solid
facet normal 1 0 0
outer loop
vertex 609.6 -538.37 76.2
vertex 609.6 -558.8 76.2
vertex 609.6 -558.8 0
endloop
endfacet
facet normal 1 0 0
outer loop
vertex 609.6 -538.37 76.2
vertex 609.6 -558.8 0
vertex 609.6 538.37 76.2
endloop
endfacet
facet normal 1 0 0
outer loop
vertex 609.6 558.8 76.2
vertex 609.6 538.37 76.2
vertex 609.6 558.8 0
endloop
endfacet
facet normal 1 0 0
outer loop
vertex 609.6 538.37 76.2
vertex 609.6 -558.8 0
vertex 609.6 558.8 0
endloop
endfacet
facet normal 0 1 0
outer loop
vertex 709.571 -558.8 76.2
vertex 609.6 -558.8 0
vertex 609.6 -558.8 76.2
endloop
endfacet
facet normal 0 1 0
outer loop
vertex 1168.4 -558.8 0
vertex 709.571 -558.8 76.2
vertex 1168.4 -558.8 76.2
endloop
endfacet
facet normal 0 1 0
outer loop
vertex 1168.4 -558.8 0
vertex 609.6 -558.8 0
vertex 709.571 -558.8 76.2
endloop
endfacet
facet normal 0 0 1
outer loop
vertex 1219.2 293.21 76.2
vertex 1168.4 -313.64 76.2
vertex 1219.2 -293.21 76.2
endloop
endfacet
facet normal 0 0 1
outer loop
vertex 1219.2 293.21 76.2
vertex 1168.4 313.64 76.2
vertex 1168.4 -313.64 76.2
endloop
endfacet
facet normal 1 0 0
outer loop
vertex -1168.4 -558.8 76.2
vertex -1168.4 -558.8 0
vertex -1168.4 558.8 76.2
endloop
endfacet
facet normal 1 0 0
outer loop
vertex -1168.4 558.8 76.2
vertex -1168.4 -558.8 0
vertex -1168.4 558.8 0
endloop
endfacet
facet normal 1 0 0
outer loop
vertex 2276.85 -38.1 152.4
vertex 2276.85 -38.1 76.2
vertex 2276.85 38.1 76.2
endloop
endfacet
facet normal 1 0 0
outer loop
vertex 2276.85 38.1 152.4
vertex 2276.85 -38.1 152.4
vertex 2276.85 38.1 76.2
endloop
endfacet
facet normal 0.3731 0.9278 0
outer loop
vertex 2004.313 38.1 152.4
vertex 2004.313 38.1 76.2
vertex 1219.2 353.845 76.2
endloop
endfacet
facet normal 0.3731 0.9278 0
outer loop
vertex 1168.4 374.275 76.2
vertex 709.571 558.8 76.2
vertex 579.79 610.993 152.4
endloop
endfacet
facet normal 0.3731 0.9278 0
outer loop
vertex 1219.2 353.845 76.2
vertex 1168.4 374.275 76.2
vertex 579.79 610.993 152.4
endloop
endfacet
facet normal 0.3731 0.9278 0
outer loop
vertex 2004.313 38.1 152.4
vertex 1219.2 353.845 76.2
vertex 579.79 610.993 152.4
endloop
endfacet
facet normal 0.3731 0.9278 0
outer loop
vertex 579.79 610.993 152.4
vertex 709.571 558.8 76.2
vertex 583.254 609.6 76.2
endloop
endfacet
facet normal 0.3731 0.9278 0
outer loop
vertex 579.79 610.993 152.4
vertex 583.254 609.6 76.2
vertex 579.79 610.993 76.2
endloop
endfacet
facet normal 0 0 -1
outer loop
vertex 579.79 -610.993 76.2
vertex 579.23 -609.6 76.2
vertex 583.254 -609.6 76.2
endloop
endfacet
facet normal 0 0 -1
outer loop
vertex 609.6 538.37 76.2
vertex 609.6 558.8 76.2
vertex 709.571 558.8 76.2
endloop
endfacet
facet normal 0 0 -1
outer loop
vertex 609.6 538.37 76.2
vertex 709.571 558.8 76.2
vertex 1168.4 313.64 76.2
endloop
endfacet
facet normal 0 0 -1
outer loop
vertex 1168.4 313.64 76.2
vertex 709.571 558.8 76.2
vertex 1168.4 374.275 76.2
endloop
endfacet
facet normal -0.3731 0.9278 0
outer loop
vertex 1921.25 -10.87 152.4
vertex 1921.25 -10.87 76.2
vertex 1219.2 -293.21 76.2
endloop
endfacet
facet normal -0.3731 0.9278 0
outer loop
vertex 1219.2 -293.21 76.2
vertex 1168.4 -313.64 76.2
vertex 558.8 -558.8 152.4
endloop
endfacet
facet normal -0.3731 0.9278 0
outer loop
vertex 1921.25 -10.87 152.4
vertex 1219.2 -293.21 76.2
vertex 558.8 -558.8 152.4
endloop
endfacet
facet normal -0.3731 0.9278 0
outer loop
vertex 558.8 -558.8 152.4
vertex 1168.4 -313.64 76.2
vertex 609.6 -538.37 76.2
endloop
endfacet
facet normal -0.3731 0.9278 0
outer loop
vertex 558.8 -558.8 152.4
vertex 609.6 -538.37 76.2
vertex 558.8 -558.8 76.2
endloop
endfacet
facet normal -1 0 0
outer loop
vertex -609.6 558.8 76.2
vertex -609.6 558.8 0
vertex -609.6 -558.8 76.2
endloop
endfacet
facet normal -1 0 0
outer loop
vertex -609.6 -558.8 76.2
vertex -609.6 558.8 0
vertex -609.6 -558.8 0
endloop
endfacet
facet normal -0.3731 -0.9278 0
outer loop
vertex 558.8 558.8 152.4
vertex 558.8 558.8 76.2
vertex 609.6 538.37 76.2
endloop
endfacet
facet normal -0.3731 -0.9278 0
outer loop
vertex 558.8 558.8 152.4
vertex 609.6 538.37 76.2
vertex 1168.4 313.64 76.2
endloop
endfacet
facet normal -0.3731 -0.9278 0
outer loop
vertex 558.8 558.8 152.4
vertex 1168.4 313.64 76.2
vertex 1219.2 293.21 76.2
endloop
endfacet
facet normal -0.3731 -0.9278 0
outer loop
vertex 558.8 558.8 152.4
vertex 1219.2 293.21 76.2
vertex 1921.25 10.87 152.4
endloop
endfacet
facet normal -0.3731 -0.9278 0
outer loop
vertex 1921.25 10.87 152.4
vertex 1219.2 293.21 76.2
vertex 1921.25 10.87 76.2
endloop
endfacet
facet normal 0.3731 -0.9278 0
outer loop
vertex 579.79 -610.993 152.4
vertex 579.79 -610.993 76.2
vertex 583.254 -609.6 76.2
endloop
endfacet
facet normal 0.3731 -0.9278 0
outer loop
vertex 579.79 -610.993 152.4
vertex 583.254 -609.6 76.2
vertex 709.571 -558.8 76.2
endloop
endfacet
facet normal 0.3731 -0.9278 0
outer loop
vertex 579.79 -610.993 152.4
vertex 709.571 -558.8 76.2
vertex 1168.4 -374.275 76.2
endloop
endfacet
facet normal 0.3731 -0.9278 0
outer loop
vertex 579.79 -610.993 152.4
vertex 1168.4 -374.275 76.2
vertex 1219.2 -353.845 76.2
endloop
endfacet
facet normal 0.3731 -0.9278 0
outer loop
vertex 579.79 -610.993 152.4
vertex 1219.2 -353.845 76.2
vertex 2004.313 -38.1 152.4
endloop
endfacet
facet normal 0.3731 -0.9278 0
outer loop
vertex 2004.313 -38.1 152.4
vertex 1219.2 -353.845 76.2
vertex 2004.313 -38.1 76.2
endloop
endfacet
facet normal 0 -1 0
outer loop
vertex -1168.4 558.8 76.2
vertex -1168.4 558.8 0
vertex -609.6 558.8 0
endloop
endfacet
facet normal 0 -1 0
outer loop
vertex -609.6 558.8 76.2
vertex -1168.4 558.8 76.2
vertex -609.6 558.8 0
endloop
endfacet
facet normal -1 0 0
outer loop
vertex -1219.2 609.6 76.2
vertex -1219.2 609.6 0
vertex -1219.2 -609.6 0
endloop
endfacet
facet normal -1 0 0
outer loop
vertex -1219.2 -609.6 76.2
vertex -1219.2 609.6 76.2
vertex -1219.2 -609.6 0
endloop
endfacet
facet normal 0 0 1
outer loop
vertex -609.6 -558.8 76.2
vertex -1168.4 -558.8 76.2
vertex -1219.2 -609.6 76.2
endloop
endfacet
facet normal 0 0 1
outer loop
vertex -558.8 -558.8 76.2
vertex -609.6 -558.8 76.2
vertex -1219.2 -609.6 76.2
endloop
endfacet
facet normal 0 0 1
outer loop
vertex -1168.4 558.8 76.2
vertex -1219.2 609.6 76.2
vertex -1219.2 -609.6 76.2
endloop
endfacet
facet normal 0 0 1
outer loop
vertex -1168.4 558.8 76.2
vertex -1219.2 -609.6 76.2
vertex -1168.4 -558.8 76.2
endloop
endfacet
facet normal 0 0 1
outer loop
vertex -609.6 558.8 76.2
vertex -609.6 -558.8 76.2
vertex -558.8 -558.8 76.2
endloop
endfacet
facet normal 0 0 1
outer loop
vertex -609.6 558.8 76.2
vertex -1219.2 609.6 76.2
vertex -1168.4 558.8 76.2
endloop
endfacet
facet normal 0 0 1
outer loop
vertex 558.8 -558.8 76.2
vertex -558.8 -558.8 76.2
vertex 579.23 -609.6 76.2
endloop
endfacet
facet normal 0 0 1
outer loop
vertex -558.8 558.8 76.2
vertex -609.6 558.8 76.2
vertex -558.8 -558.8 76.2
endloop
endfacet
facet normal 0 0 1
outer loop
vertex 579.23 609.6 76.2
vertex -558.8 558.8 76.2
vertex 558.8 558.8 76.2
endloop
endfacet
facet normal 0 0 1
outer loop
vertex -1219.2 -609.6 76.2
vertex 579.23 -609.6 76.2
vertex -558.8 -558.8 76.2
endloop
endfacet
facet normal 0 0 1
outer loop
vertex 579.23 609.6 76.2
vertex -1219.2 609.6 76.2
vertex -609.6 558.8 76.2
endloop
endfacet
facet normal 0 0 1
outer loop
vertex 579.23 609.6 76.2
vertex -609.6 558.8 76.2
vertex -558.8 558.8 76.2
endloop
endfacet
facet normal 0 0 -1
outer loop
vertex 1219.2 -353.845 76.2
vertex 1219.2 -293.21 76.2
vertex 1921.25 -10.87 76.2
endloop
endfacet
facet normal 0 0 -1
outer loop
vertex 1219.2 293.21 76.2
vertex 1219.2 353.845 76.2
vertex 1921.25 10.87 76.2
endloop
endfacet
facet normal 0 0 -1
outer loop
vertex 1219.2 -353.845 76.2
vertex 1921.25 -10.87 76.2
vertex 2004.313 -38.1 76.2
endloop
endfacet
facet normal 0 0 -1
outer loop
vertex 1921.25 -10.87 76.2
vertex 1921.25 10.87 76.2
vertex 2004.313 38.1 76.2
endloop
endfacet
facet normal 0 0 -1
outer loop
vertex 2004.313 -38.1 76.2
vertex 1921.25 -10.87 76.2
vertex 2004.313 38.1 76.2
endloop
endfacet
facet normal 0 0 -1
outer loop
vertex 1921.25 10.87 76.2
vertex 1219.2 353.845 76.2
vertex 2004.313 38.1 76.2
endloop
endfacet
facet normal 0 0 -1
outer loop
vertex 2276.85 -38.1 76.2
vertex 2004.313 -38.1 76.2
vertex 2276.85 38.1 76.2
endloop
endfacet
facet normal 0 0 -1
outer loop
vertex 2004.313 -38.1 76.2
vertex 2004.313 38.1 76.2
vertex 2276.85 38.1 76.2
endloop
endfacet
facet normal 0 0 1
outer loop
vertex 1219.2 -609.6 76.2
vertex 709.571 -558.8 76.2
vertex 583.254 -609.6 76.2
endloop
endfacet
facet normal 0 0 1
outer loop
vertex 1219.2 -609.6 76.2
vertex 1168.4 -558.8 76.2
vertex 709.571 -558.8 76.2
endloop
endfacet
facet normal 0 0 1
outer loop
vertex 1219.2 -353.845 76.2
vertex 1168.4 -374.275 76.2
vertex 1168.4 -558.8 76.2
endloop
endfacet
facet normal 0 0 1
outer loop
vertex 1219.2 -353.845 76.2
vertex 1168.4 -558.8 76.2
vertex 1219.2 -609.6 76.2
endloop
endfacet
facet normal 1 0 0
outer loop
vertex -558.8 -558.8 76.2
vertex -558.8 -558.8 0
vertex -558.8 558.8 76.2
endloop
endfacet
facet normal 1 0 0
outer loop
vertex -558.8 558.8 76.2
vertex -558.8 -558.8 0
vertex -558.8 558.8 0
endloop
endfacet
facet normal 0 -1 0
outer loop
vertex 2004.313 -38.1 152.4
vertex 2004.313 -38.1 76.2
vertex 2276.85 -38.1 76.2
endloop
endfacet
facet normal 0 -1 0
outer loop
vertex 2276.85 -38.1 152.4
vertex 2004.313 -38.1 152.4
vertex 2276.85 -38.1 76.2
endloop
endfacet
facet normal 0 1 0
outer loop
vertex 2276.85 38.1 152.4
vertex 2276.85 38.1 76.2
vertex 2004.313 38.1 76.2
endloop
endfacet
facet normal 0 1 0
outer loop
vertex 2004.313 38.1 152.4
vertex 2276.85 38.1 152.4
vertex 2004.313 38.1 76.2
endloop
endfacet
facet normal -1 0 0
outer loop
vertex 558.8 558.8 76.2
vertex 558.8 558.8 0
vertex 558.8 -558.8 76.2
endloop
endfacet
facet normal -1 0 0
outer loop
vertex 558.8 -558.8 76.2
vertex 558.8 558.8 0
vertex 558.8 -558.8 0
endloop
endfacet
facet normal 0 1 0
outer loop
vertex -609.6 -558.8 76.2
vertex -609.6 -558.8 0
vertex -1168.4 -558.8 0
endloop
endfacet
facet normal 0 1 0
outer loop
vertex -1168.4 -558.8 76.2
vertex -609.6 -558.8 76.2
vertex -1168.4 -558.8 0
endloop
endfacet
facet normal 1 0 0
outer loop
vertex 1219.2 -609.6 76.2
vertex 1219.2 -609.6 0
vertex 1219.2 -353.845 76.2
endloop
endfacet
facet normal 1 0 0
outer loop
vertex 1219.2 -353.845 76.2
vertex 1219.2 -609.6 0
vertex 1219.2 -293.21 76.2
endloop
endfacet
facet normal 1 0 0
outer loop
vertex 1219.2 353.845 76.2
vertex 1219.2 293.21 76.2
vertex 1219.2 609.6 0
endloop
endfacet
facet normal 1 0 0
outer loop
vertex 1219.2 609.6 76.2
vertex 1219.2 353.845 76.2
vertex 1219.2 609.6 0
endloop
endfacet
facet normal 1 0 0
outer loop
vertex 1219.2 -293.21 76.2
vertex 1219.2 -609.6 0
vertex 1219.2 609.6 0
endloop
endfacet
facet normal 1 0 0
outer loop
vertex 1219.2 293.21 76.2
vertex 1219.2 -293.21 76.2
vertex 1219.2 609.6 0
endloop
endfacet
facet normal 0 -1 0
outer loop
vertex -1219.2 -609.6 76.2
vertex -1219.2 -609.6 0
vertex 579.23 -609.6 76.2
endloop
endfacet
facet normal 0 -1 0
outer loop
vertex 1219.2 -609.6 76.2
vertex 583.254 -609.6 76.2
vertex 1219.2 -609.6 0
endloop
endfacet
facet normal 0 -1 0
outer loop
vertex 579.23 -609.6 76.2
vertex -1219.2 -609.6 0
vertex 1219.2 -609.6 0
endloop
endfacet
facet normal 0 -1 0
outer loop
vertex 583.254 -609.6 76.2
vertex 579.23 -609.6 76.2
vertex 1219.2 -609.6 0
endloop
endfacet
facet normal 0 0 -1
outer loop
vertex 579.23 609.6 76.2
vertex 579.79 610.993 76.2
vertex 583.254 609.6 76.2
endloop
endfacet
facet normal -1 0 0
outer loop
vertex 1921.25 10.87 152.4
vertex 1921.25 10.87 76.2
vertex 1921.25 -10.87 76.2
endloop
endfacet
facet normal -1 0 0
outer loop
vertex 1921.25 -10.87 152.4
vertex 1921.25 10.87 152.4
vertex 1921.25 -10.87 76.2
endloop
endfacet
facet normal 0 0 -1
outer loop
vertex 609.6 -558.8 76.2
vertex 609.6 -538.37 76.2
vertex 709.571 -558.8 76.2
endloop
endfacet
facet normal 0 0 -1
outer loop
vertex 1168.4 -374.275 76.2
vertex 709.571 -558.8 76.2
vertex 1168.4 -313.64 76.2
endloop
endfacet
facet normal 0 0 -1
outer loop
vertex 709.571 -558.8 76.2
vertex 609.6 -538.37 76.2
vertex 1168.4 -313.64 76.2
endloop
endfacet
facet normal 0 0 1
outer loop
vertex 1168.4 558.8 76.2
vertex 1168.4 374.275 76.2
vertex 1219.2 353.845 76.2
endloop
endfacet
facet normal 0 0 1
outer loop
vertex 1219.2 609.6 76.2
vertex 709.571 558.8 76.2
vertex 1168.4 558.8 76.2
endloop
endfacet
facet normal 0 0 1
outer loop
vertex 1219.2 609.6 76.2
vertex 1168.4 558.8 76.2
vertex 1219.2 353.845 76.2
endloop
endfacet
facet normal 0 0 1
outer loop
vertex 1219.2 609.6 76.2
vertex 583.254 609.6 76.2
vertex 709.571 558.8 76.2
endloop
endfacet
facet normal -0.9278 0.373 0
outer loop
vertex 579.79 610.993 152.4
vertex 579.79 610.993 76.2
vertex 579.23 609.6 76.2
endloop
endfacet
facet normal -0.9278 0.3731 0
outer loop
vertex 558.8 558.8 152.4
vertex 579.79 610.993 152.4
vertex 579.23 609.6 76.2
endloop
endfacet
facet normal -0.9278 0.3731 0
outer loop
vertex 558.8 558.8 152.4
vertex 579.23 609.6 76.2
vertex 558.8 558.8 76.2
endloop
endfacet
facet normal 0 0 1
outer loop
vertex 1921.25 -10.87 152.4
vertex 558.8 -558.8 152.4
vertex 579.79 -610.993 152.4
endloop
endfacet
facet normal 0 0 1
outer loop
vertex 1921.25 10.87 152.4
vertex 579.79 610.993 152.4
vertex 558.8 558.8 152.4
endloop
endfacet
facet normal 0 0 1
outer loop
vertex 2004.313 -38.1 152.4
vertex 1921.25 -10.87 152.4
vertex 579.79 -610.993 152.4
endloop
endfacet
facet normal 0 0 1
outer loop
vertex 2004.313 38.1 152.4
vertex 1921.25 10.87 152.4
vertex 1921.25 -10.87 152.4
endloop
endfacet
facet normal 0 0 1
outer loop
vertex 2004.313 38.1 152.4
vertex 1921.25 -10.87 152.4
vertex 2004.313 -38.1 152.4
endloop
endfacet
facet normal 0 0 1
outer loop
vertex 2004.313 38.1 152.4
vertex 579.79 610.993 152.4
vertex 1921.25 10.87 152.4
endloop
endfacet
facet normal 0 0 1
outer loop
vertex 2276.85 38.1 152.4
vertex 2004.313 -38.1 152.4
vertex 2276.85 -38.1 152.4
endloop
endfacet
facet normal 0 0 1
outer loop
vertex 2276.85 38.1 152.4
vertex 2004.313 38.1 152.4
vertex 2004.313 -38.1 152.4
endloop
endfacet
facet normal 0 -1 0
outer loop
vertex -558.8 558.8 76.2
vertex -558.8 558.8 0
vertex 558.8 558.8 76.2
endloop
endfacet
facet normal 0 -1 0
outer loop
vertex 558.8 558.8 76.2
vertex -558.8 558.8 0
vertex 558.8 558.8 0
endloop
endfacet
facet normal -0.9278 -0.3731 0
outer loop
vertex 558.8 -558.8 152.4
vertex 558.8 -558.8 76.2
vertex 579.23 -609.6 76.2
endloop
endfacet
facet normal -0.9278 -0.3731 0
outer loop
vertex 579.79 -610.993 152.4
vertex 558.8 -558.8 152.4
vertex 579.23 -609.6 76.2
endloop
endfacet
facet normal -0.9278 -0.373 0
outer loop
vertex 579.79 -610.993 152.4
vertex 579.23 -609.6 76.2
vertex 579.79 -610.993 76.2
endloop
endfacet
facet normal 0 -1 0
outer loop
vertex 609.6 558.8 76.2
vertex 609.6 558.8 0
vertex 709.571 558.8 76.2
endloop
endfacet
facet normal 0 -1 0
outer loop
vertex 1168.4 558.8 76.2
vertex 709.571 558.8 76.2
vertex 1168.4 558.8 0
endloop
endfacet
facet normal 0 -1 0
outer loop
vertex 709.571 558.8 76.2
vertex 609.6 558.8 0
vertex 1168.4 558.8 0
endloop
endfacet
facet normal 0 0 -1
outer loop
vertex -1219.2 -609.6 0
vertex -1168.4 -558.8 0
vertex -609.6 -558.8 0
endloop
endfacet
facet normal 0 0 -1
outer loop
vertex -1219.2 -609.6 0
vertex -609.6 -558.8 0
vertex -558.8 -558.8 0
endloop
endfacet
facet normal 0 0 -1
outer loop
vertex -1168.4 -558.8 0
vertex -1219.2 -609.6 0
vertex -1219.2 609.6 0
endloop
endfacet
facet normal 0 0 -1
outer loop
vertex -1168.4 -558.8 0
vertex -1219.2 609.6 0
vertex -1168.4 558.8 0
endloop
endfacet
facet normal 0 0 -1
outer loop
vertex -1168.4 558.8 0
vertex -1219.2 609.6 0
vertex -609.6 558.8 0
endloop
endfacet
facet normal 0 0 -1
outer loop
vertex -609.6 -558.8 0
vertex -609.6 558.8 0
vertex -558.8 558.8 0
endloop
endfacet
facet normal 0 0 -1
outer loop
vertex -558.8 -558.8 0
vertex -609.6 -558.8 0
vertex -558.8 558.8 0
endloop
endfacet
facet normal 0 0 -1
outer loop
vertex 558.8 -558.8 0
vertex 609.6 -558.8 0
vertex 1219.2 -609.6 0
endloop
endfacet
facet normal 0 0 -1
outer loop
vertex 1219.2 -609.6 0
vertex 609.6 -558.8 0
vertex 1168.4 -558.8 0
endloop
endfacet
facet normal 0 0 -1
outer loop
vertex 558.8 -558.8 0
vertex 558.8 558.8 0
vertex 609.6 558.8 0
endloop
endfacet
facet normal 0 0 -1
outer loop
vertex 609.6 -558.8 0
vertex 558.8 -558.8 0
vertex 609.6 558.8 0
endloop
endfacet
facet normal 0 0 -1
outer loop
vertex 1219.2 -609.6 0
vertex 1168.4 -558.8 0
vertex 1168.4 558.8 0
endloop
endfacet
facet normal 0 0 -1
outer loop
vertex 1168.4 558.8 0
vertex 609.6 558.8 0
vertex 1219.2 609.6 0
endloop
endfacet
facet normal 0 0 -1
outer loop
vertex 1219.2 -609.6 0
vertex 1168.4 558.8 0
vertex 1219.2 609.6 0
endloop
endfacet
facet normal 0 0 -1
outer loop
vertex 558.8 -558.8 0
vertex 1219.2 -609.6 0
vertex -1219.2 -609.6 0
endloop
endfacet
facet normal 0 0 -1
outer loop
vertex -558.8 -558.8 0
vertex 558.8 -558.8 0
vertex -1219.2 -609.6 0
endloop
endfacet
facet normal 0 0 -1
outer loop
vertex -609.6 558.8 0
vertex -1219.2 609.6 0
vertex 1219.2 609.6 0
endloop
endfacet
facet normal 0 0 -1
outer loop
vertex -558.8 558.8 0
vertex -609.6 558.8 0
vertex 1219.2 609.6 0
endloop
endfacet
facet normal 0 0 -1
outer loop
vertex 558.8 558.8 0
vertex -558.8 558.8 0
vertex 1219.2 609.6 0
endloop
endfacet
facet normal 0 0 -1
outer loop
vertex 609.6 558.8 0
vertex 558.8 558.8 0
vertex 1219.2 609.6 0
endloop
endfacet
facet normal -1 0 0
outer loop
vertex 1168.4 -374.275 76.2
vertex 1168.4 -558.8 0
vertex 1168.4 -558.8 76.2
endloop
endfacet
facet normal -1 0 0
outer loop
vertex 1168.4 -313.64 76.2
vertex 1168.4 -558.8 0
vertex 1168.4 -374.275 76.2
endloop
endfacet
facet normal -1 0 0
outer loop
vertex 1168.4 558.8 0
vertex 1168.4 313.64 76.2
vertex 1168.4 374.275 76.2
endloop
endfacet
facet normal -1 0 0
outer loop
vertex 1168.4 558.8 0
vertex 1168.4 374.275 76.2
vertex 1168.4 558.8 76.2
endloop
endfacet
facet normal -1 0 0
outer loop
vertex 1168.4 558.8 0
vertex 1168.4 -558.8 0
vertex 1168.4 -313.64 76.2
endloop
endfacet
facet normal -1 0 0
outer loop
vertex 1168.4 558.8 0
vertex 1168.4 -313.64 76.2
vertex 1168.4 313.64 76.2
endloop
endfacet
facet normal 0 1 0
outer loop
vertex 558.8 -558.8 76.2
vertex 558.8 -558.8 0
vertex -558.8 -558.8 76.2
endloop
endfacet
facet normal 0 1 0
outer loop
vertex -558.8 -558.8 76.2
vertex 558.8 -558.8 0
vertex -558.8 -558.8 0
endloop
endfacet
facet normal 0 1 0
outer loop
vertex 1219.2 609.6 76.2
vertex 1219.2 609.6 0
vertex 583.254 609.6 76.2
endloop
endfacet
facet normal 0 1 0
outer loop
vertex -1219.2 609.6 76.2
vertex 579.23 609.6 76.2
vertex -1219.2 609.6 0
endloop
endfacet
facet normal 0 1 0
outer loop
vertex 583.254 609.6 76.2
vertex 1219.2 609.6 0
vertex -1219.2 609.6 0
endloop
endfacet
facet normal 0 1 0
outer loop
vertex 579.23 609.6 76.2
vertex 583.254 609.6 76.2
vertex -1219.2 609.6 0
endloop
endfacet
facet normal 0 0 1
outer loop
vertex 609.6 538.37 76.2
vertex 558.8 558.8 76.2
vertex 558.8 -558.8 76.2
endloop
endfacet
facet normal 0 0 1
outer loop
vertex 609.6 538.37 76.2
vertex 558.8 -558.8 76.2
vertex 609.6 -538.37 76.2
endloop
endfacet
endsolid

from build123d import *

# Parameters (mm, degrees)
F0_W     = 50.8
F0_H     = 1117.6
F0_H_2   = 50.8
F0_W_2   = 558.8
F0_W_3   = 1117.6
F1_DEPTH = 76.2
F3_DEPTH = 76.2


with BuildPart() as f1:
    # F0 (on Top) → F1 (new body)
    with BuildSketch(Plane.XY):
        with Locations((584.2, 0)):
            Rectangle(F0_W, F0_H)
        with Locations((584.2, -584.2)):
            Rectangle(F0_W, F0_H_2)
        with Locations((889, -584.2)):
            Rectangle(F0_W_2, F0_H_2)
        with Locations((0, -584.2)):
            Rectangle(F0_W_3, F0_H_2)
        with Locations((-584.2, -584.2)):
            Rectangle(F0_W, F0_H_2)
        with Locations((-584.2, 0)):
            Rectangle(F0_W, F0_H)
        with Locations((-889, -584.2)):
            Rectangle(F0_W_2, F0_H_2)
        with Locations((-1193.8, -584.2)):
            Rectangle(F0_W, F0_H_2)
        with Locations((-1193.8, 0)):
            Rectangle(F0_W, F0_H)
        with Locations((-1193.8, 584.2)):
            Rectangle(F0_W, F0_H_2)
        with Locations((-889, 584.2)):
            Rectangle(F0_W_2, F0_H_2)
        with Locations((0, 584.2)):
            Rectangle(F0_W_3, F0_H_2)
        with Locations((-584.2, 584.2)):
            Rectangle(F0_W, F0_H_2)
        with Locations((584.2, 584.2)):
            Rectangle(F0_W, F0_H_2)
        with Locations((889, 584.2)):
            Rectangle(F0_W_2, F0_H_2)
        with Locations((1193.8, 584.2)):
            Rectangle(F0_W, F0_H_2)
        with Locations((1193.8, 0)):
            Rectangle(F0_W, F0_H)
        with Locations((1193.8, -584.2)):
            Rectangle(F0_W, F0_H_2)
    extrude(amount=F1_DEPTH)

    # F2 (on face) → F3 (join)
    with BuildSketch(Plane.XY.offset(76.2)):
        Polygon((579.7902736313, 610.9931861274), (558.8, 558.8), (1921.2501768745, 10.8702002789), (1921.2501768745, 38.1), (2004.3129463656, 38.1), align=None)
        Polygon((1921.2501768745, 38.1), (1921.2501768745, 10.8702002789), (1948.2793807983, 0), (1921.2501768745, -10.8702002789), (1921.2501768745, -38.1), (2004.3129463656, -38.1), (2099.0501768745, 0), (2004.3129463656, 38.1), align=None)
        Polygon((1948.2793807983, 0), (1921.2501768745, 10.8702002789), (1921.2501768745, -10.8702002789), align=None)
        Polygon((1921.2501768745, -38.1), (1921.2501768745, -10.8702002789), (558.8, -558.8), (579.7902736313, -610.9931861274), (2004.3129463656, -38.1), align=None)
        Polygon((2276.8501768745, 38.1), (2004.3129463656, 38.1), (2099.0501768745, 0), (2004.3129463656, -38.1), (2276.8501768745, -38.1), align=None)
    extrude(amount=F3_DEPTH)


solid = f1.part
